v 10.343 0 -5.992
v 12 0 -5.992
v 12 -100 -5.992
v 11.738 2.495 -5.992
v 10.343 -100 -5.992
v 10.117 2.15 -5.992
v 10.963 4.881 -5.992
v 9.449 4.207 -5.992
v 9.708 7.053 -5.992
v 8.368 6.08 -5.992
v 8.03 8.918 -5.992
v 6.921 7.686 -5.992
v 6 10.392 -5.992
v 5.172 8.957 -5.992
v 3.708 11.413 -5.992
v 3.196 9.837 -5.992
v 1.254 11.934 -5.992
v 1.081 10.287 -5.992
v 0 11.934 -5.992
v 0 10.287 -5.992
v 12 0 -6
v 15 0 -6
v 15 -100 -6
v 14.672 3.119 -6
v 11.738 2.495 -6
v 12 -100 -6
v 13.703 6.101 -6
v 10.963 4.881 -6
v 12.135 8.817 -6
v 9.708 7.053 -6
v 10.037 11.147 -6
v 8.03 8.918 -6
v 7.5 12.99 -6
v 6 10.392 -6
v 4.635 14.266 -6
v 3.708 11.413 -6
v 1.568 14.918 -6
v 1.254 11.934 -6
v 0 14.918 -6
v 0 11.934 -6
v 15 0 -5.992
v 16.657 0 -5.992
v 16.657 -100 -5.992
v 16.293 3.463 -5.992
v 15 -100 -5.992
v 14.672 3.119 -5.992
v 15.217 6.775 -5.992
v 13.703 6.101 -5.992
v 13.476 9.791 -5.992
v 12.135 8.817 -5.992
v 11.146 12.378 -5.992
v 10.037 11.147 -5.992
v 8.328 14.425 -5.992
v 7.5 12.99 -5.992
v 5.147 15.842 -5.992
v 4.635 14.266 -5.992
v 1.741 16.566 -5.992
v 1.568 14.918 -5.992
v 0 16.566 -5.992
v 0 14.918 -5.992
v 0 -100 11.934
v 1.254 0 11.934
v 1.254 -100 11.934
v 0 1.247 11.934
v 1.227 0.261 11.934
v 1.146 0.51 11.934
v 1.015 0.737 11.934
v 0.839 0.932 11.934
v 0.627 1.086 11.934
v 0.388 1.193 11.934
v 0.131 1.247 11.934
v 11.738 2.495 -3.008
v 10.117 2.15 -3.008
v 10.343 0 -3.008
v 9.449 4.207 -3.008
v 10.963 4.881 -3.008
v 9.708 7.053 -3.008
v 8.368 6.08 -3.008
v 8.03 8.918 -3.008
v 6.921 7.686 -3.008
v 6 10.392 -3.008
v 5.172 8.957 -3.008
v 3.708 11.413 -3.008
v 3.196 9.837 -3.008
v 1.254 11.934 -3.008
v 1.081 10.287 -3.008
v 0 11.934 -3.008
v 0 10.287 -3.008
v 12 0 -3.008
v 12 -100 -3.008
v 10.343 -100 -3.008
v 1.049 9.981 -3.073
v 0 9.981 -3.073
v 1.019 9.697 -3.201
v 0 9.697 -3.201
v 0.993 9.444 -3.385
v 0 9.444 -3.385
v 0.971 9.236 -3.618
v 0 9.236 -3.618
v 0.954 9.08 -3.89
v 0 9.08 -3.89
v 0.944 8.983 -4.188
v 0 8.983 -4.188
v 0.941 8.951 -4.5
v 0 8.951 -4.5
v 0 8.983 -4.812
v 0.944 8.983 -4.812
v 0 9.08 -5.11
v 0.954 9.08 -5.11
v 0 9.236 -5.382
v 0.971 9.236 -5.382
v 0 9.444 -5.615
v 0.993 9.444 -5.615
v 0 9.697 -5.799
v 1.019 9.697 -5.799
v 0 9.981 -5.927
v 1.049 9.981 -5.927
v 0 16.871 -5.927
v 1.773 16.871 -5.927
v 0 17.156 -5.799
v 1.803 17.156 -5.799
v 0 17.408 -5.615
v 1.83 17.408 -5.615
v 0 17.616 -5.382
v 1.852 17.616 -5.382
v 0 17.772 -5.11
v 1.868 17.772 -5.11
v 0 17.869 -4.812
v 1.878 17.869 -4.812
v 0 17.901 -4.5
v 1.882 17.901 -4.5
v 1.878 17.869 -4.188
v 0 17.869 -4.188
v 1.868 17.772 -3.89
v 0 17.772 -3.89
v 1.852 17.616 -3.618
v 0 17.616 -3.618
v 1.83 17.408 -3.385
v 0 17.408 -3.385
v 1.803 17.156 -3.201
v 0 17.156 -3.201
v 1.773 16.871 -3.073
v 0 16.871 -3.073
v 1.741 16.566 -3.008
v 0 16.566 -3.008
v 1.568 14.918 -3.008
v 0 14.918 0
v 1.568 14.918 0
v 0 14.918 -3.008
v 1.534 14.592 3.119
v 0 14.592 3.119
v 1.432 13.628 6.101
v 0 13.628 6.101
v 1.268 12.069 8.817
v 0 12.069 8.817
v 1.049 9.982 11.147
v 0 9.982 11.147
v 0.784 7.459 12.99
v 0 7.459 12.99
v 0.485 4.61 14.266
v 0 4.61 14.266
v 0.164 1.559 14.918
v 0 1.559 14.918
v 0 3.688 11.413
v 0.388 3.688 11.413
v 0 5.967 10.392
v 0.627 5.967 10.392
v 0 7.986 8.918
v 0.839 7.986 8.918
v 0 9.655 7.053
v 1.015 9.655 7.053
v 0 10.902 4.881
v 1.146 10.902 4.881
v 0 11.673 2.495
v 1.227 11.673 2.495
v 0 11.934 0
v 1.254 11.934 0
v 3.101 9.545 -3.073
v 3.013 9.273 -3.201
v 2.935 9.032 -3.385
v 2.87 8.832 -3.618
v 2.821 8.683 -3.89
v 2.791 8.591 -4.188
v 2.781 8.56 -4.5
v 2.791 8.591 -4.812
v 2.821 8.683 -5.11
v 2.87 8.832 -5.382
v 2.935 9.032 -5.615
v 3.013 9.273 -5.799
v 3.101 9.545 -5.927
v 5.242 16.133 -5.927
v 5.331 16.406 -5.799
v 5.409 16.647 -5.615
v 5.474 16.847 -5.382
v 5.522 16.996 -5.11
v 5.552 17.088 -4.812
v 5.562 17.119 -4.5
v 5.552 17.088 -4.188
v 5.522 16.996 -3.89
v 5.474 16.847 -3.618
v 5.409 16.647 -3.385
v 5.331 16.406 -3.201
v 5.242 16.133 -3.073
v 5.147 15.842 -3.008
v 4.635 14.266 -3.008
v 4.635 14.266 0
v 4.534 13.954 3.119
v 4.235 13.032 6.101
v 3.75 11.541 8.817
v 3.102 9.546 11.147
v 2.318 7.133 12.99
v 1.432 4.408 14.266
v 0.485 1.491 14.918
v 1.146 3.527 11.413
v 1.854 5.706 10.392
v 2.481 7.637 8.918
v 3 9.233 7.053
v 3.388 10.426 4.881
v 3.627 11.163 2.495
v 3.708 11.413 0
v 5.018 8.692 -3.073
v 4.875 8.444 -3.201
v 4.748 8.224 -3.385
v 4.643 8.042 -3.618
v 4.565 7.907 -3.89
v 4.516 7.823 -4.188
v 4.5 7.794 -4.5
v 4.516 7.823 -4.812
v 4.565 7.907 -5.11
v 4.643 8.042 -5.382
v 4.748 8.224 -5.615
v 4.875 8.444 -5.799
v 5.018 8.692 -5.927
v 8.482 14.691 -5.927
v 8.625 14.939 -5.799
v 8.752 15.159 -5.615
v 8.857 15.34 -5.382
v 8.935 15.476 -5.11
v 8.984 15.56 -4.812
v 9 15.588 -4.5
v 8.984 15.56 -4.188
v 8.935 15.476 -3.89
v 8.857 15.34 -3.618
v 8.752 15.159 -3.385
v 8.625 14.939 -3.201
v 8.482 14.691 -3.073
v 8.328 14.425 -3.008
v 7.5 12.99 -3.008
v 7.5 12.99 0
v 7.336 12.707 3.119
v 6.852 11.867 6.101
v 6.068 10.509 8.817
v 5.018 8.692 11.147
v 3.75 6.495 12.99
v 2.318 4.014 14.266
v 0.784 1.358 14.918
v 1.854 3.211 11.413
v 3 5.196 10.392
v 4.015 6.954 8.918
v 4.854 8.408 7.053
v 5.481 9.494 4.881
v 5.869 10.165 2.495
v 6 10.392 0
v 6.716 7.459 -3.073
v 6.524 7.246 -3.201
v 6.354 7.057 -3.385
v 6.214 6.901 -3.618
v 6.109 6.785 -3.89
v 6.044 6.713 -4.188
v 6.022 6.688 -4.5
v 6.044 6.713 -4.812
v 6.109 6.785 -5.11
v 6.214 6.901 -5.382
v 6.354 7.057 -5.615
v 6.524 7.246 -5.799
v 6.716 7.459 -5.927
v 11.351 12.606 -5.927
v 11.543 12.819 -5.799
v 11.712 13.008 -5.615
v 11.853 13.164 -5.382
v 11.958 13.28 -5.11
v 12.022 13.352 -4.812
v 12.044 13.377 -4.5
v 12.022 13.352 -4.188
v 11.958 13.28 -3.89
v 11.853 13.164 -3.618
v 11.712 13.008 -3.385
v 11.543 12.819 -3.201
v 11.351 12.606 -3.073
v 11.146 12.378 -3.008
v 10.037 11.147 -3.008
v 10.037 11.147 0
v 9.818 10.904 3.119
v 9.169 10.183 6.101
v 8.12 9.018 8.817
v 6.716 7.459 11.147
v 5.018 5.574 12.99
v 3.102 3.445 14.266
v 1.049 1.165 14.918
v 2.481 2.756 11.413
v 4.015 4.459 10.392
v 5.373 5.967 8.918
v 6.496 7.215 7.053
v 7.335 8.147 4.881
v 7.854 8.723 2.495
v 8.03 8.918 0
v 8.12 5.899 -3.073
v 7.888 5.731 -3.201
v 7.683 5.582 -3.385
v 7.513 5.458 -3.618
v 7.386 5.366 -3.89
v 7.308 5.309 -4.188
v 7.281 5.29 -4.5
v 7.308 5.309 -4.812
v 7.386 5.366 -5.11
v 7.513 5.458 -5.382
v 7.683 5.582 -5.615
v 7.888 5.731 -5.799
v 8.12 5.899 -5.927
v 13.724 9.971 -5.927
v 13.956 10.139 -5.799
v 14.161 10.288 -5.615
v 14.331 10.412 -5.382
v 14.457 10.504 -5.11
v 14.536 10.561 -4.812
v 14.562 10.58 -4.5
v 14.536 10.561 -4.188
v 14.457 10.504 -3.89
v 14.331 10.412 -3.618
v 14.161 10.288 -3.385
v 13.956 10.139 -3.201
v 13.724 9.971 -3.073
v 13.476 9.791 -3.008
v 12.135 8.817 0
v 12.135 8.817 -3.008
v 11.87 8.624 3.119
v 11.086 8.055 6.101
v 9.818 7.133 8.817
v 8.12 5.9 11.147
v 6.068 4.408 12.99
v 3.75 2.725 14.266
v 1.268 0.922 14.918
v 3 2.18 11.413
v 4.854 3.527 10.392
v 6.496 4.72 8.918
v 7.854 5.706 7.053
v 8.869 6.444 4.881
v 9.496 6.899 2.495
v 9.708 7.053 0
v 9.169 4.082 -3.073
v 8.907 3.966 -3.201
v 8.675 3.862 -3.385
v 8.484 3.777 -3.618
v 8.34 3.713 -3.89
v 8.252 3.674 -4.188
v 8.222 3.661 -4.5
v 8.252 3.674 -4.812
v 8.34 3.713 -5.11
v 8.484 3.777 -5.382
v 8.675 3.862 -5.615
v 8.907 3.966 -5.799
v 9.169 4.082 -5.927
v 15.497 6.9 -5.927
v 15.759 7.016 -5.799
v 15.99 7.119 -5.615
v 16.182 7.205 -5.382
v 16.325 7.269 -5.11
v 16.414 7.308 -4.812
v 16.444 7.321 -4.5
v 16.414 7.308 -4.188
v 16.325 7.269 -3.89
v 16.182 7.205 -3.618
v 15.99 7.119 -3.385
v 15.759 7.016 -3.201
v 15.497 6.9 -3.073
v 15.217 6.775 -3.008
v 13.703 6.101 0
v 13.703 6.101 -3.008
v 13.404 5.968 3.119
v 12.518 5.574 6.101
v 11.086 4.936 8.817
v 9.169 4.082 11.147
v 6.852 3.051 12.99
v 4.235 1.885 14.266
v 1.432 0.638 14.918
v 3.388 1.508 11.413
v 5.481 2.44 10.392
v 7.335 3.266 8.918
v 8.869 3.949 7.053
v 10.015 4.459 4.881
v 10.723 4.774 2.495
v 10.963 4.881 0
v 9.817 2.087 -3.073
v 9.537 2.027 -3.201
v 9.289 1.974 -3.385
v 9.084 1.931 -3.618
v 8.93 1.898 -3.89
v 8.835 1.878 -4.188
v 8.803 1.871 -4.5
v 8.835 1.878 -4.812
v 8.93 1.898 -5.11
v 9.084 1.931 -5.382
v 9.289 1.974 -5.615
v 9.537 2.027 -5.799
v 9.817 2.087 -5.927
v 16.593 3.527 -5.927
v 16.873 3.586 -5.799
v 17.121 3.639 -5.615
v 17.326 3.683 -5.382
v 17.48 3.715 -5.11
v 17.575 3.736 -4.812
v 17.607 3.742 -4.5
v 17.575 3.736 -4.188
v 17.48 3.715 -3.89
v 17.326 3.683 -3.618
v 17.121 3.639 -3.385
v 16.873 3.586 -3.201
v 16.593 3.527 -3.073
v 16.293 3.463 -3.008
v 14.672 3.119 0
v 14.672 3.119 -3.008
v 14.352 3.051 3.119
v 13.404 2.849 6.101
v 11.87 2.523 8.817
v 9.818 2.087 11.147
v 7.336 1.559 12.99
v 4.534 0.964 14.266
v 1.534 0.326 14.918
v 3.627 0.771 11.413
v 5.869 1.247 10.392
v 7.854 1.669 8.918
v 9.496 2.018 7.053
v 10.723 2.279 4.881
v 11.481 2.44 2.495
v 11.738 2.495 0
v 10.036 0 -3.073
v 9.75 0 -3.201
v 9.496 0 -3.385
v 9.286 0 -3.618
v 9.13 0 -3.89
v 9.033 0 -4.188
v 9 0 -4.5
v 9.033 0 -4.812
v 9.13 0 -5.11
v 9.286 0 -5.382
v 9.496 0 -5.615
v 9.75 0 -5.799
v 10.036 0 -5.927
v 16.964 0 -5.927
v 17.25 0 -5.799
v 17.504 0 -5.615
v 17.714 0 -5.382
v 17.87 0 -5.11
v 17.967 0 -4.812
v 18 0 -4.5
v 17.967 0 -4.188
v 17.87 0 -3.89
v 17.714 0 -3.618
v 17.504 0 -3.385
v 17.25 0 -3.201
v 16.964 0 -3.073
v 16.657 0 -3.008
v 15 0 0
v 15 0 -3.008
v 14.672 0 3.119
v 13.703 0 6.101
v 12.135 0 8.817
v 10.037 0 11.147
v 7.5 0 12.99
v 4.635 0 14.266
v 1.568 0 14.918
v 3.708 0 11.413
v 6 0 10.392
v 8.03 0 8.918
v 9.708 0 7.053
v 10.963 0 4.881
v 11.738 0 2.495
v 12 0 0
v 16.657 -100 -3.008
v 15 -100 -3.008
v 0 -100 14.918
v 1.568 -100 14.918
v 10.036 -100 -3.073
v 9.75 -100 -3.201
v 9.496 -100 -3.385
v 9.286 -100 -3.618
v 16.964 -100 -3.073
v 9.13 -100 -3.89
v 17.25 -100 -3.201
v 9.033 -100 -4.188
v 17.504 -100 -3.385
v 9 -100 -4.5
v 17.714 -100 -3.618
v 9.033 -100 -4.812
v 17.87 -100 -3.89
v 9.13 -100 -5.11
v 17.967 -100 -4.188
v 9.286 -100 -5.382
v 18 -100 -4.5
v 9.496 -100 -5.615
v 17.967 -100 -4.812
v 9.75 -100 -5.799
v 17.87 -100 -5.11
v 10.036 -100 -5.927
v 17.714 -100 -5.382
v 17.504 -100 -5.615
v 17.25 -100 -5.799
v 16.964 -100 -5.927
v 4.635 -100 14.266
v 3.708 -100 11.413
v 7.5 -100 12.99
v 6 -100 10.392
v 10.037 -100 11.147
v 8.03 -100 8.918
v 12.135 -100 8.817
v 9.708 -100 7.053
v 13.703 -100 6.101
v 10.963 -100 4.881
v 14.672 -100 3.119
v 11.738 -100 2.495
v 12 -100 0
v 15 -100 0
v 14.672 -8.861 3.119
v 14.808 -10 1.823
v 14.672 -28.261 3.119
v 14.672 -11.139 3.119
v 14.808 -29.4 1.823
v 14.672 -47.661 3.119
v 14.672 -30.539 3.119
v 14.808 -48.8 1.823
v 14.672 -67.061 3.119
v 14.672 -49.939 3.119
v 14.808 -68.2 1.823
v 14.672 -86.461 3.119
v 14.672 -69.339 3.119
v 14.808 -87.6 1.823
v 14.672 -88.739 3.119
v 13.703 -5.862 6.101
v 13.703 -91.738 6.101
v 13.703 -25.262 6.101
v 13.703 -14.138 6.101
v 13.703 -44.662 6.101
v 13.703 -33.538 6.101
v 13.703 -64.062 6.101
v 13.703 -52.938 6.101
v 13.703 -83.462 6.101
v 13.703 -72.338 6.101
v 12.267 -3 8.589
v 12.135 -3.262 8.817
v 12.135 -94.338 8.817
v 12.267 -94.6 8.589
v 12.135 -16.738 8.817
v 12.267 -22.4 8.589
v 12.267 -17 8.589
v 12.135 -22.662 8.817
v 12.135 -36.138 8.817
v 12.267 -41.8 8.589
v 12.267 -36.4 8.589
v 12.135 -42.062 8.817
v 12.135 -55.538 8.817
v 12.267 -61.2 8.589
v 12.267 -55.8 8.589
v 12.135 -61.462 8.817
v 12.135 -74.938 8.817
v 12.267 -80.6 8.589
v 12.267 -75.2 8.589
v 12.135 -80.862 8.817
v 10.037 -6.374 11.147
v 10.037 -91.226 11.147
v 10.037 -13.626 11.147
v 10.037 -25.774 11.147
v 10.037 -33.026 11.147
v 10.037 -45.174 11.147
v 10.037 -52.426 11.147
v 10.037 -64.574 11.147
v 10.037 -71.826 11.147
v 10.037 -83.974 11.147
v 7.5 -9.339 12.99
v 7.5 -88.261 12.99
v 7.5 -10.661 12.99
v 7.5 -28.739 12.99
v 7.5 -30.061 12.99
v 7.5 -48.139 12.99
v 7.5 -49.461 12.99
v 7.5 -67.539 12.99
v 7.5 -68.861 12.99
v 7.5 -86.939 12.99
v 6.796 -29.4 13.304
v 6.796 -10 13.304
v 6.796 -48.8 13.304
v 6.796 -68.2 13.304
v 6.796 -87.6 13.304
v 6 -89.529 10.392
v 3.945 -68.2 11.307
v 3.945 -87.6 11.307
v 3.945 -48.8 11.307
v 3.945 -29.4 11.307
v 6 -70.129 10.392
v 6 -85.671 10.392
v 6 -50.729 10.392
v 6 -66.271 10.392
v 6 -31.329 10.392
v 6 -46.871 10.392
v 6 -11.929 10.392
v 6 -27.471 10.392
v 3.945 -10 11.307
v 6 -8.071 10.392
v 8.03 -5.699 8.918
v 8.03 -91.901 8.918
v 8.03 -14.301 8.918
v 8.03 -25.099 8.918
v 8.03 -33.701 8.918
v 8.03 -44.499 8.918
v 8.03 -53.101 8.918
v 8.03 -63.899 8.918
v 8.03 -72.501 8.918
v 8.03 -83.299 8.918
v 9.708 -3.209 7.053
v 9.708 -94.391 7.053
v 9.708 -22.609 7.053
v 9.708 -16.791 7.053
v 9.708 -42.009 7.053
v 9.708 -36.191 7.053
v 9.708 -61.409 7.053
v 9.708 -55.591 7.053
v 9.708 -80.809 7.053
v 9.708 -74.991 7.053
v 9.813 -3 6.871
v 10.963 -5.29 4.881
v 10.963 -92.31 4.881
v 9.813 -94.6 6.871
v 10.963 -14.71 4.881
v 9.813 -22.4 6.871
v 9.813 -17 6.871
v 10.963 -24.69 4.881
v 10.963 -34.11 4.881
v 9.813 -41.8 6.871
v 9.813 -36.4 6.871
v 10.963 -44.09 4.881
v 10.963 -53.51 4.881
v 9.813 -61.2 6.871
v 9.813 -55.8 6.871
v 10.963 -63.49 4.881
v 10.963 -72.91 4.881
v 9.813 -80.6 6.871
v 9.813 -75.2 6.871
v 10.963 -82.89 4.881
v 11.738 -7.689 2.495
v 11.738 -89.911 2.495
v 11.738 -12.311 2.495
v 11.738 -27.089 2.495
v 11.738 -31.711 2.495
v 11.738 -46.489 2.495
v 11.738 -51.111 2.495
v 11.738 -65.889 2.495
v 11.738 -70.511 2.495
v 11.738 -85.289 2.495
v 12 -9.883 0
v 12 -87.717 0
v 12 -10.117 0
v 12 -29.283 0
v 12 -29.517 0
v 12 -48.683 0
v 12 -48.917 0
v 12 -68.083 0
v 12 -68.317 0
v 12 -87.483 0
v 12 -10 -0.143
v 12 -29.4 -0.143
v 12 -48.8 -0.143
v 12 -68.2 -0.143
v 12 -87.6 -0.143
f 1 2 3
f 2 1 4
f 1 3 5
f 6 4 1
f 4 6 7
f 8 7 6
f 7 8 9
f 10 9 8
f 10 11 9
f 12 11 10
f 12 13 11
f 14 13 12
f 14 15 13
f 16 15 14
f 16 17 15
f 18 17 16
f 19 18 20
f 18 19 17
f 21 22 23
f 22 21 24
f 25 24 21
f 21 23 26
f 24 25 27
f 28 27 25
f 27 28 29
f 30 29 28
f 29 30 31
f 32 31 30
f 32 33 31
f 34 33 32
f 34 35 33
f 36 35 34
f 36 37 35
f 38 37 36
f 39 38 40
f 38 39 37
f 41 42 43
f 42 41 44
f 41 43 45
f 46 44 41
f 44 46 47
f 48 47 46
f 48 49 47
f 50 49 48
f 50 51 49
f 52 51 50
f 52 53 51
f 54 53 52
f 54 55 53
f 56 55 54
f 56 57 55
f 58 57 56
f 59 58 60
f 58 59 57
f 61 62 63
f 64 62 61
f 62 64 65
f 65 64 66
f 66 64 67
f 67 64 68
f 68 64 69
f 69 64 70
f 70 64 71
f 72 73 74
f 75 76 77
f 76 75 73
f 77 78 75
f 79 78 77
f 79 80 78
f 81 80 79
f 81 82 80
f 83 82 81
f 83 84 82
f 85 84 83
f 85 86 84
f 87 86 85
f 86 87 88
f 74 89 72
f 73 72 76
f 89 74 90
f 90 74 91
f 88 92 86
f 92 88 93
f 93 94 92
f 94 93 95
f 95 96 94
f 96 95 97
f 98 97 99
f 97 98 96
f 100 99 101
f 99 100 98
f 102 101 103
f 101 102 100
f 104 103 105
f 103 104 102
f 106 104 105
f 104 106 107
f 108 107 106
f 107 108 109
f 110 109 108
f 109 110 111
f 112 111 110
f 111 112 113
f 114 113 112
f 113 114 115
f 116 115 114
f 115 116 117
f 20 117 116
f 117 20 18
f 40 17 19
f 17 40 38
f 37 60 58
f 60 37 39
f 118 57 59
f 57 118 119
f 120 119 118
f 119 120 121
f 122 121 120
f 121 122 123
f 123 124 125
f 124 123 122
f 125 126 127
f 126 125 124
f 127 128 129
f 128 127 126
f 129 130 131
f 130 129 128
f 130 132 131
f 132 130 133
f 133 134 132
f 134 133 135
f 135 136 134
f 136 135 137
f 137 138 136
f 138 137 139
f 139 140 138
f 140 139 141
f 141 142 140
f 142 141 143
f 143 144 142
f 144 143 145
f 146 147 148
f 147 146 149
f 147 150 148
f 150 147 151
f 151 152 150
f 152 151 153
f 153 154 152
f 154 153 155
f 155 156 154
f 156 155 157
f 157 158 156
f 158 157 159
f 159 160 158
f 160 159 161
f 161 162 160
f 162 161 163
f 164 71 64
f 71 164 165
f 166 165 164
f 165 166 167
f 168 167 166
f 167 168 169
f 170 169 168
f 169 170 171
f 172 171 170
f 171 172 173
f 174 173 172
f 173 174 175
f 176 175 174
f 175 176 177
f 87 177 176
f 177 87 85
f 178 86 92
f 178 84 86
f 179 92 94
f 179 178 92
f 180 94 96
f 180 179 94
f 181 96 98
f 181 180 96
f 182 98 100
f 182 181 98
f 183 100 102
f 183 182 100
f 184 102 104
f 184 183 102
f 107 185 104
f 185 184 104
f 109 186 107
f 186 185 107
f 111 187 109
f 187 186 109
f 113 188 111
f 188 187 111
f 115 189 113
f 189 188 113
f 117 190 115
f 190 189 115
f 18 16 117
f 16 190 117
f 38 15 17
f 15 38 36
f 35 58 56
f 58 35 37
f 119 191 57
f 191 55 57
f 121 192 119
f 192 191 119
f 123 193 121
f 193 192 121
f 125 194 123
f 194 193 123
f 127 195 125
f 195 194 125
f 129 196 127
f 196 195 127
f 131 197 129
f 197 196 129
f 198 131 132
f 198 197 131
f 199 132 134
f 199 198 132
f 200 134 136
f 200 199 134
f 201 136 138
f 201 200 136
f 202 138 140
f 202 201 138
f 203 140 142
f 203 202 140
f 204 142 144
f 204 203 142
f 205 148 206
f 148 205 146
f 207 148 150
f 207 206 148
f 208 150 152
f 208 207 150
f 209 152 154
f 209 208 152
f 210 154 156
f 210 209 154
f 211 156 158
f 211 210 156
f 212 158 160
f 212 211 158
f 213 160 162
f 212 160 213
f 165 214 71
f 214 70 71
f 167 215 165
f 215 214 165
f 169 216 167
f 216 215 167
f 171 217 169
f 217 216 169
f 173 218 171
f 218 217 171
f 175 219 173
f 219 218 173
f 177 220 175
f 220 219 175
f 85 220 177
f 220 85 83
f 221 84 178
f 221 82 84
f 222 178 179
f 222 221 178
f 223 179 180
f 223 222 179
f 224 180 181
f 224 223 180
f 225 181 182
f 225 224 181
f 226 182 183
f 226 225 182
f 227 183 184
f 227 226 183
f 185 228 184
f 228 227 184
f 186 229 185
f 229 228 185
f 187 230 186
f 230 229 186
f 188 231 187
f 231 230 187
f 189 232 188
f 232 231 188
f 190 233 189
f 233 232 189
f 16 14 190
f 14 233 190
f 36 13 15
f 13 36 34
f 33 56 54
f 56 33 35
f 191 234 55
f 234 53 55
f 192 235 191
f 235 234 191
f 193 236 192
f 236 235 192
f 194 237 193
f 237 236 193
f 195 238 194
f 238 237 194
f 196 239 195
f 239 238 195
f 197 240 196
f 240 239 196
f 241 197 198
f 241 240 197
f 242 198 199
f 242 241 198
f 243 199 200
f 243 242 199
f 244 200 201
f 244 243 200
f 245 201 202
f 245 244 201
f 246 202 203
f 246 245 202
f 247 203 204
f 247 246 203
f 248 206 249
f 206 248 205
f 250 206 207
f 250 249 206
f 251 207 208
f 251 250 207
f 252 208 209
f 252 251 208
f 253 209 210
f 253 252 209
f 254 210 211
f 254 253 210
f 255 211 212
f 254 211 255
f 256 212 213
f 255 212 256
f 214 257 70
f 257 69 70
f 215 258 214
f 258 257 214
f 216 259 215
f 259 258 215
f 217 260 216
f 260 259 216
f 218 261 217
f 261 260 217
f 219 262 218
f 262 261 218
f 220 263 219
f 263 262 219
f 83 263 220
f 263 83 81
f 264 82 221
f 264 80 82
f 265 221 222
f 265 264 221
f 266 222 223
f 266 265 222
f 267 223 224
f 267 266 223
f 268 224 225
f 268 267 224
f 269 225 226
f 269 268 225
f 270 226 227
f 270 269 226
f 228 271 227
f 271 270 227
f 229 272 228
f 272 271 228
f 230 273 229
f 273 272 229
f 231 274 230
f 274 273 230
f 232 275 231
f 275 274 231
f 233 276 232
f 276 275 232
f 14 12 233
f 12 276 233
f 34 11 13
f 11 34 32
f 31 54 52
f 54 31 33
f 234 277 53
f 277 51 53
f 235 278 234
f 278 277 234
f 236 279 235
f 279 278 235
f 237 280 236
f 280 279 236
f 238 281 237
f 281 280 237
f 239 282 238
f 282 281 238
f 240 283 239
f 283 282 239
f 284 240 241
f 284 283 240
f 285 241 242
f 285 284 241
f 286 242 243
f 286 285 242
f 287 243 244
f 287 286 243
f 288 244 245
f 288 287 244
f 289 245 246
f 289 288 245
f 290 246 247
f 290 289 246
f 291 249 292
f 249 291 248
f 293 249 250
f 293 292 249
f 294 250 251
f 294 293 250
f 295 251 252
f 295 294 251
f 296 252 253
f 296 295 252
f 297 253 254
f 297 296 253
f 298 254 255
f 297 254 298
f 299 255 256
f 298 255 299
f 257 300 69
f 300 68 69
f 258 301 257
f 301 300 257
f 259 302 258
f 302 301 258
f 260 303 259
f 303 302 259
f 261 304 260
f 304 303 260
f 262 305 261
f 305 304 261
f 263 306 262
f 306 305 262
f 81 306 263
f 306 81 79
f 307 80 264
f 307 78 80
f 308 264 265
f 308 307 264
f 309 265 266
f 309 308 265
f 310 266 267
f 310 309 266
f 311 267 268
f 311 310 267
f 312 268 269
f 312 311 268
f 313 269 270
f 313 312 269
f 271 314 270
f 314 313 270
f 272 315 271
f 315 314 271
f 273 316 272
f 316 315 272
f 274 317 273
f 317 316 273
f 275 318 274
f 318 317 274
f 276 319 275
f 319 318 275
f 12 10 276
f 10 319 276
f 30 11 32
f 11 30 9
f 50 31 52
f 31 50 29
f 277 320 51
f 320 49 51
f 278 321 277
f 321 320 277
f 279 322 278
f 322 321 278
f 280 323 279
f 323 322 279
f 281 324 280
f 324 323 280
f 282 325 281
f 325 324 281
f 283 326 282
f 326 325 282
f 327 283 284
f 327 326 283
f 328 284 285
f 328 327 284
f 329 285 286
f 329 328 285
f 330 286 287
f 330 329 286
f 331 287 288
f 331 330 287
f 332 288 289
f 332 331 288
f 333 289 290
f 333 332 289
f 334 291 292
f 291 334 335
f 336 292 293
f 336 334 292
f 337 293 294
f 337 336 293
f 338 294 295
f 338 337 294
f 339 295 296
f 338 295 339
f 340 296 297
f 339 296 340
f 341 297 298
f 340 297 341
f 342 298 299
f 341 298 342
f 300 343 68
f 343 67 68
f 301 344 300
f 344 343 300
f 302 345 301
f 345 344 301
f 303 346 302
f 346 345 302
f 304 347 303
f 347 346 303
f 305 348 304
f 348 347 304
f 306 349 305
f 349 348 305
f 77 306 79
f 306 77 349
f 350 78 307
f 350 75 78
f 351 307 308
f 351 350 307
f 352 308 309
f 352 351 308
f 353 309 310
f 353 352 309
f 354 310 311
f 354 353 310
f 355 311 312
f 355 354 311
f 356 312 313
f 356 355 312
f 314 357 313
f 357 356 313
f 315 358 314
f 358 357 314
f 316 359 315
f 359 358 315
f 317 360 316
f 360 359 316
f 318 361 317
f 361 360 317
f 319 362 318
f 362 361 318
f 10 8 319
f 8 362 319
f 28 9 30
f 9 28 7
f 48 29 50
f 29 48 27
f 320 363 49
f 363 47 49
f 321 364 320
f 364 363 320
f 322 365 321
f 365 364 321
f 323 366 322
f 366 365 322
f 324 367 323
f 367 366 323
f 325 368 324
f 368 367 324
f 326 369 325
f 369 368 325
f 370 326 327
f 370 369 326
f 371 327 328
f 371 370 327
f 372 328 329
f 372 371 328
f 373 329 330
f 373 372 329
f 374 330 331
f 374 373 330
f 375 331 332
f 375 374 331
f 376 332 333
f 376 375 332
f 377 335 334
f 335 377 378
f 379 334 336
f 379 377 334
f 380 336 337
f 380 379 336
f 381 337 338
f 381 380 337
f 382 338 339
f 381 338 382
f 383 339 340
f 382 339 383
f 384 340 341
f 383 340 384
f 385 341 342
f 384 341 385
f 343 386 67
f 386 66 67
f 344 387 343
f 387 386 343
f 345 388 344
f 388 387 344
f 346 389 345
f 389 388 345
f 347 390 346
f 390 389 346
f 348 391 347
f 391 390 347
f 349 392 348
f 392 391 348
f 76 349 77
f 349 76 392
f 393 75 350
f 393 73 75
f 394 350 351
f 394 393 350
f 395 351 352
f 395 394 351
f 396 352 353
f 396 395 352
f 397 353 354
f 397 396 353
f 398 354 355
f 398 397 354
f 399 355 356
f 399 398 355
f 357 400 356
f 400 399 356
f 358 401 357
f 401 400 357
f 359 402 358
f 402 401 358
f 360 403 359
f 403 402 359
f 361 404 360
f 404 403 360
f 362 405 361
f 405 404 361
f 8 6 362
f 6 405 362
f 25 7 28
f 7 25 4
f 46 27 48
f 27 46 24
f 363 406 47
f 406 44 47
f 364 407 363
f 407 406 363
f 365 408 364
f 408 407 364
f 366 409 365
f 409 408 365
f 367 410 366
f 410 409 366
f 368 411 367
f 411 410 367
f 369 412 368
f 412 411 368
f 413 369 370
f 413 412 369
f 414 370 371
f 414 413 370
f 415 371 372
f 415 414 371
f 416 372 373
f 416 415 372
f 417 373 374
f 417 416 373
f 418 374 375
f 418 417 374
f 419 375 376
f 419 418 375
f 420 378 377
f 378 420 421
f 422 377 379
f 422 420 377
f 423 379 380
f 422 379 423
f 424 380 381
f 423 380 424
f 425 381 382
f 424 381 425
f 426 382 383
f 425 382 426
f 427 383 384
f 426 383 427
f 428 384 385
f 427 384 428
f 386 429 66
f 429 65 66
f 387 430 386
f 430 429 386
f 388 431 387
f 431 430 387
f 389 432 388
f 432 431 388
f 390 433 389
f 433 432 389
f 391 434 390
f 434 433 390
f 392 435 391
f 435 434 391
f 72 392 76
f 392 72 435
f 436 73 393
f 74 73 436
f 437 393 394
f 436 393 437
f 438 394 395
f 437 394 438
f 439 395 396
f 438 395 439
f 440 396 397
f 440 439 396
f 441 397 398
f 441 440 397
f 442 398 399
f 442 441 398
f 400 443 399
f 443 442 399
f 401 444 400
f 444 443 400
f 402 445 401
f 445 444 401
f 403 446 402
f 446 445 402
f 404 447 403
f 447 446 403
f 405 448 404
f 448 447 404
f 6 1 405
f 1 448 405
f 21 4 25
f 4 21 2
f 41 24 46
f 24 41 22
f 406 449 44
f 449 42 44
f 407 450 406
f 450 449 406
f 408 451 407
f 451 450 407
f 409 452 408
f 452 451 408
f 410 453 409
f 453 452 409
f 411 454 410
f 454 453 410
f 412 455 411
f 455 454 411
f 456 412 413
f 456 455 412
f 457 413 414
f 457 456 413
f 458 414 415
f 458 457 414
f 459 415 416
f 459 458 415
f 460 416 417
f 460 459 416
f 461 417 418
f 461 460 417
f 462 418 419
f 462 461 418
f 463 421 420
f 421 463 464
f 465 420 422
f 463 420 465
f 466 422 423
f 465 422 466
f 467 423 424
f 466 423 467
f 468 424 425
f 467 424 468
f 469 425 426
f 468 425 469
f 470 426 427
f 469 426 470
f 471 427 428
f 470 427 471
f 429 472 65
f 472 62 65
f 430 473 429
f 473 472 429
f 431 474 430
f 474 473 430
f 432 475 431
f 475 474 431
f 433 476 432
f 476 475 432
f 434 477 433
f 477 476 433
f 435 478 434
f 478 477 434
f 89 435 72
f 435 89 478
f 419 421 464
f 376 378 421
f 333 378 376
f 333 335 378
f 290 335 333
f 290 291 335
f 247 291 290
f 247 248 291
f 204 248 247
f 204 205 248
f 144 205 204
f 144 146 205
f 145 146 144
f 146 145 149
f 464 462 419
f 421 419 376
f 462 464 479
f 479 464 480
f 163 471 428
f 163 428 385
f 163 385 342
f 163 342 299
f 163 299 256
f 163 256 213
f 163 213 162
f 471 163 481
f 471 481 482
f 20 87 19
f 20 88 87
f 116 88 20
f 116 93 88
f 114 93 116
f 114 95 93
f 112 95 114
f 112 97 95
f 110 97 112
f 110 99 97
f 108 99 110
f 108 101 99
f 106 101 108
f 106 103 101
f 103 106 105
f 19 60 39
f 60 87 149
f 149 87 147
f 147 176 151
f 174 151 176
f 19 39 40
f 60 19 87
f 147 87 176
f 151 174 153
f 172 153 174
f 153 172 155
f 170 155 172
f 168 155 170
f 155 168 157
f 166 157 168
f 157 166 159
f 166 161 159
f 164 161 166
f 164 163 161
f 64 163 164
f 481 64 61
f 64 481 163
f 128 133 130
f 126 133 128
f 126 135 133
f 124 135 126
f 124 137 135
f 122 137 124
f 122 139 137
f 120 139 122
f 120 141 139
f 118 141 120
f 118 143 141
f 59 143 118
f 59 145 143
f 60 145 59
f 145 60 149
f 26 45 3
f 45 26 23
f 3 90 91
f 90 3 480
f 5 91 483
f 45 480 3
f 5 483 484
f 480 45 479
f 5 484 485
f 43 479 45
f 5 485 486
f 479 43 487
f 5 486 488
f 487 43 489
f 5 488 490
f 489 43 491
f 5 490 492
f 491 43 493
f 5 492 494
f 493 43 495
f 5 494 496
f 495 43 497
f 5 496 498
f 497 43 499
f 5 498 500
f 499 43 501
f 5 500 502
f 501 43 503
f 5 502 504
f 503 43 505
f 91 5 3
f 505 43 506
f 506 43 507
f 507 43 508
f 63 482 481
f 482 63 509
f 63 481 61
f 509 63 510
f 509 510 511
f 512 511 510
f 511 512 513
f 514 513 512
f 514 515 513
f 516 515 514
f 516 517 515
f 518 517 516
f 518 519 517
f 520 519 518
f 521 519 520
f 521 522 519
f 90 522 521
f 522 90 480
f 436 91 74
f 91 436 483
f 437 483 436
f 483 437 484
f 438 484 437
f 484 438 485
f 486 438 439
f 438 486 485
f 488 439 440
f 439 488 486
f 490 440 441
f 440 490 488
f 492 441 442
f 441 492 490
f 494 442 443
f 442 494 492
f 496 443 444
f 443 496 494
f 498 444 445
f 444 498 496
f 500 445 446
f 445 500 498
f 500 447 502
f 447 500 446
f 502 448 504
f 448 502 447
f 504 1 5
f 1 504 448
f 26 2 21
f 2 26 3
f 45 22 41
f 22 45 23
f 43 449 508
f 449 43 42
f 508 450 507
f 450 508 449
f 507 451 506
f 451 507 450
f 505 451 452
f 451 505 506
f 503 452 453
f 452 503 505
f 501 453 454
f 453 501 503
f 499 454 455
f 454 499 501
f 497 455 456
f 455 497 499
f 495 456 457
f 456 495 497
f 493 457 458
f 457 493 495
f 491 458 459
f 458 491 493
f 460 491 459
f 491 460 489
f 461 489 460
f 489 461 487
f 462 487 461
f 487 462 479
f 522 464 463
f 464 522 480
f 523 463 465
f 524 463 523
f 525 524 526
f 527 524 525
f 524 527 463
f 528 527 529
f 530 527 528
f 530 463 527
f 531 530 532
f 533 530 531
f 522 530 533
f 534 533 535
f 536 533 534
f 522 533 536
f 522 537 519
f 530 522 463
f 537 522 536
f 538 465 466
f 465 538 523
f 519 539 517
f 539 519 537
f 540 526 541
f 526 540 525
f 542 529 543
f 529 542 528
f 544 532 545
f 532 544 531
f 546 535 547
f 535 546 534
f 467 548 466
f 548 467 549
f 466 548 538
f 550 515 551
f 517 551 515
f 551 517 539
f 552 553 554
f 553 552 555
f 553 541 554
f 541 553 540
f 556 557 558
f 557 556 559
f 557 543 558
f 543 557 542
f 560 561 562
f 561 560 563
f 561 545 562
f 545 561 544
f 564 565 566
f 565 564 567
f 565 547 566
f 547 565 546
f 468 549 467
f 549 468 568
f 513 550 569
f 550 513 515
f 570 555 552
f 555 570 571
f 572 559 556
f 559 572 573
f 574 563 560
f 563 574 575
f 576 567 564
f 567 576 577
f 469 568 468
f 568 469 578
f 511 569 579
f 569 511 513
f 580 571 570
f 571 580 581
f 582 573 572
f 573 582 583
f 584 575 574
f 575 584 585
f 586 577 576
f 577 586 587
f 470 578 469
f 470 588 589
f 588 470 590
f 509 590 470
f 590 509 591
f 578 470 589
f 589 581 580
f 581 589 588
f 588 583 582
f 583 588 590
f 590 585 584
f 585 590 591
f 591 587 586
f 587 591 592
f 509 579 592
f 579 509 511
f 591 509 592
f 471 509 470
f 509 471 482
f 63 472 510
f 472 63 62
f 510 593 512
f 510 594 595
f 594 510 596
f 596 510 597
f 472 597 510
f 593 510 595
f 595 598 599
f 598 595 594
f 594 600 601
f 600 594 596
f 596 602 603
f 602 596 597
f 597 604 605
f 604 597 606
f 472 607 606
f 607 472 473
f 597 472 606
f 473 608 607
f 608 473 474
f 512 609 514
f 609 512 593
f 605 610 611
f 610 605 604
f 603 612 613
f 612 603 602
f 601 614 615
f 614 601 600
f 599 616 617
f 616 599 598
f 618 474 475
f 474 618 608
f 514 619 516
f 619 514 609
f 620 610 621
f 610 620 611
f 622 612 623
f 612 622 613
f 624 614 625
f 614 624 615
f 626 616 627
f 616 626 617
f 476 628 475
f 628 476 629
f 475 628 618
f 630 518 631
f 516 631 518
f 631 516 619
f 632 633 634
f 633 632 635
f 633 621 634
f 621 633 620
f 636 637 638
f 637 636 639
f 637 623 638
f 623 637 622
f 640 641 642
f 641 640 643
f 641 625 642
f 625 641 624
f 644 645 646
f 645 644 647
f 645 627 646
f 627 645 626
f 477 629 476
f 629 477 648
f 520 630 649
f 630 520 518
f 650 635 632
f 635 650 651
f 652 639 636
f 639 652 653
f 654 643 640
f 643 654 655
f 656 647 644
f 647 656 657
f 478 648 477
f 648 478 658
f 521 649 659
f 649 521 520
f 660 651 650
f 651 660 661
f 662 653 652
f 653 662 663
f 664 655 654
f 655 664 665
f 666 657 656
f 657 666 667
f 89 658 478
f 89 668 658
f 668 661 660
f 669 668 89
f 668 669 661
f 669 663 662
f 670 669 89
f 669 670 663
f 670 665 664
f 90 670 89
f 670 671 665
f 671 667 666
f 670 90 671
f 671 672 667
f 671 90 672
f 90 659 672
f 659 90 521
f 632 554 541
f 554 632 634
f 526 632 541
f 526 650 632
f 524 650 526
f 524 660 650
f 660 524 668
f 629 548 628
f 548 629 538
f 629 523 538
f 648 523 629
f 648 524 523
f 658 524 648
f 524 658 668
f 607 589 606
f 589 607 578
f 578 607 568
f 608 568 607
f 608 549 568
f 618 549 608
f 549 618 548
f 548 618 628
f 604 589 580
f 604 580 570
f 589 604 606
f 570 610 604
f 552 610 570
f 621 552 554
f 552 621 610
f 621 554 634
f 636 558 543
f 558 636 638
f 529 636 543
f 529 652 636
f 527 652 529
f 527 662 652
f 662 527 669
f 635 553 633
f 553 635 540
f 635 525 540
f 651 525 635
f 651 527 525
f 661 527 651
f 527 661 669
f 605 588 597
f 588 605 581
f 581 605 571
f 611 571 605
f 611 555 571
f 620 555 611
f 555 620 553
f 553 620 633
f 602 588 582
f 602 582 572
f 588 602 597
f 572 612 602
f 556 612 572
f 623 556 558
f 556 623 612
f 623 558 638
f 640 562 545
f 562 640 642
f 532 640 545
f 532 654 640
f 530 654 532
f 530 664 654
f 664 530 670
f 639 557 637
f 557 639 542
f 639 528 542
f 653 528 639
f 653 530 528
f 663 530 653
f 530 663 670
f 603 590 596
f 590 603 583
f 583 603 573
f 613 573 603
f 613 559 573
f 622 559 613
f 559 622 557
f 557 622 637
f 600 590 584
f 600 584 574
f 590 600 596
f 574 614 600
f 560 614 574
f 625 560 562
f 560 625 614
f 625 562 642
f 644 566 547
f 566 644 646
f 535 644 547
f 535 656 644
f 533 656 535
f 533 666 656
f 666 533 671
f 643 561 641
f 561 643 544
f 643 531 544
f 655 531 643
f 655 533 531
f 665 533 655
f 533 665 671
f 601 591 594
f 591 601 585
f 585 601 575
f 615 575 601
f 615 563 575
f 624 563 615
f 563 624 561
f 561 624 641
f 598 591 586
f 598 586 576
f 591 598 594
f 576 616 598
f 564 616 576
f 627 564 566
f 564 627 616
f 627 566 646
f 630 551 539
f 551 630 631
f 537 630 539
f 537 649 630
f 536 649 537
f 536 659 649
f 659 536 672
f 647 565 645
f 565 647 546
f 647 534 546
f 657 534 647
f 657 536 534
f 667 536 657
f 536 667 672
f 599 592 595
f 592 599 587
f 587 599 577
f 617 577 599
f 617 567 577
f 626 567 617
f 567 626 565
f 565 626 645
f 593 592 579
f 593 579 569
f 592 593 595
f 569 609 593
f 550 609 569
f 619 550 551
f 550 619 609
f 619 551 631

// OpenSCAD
//
//  Copyright (C) 09-01-2014 Jasper den Ouden.(ojasper.nl)
//
//  This is free software: you can redistribute it and/or modify
//  it under the terms of the GNU General Public License as published
//  by the Free Software Foundation, either version 3 of the License, or
//  (at your option) any later version.
//

$fs=0.1;

$R=15;
$t=3;
$s=0.4;

//NOTE the curve thing seems potentially overkill!
//TODO cut that out.
module rail2d()
{   intersection()
    {   circle($R);
        difference()
        {   square($R*[2,2]);
            circle($R-$t);
        }
    }
    translate([$R-$t,-2*$t]) square($t*[1,2]);
    translate([$R-1.5*$t,-1.5*$t]) hull()
    {   circle($t/2); translate([2*$t,0]) circle($t/2); }
}

module slider2d()
{   difference()
    {   union()
        {
            for(x=$t*[1.5,-1.5]) hull()
            {   translate([x,0]) circle($s+$t);
                translate([x,$t/4]) circle($t);
                translate([0,-$s]) circle(1.25*$t);
            }
        }
        translate([$t/2-$R,1.5*($t+$s)]) rail2d($t=$t+$s);
    }
}
module rail(l=100,n=5)
{
    difference()
    {   linear_extrude(height=l) rail2d();
        //Pokes holes.
        if(n>0) rotate(-145) rotate([0,-90,0]) linear_extrude(height=l) 
            for(x=[l/(2*n):(l-$t)/n:l]) translate([x,0])
                                            circle(l/(2*n)-$t,$fn=4);
    }
}
module rail_corner(a=90)
{
    intersection()
    {   rotate_extrude() rail2d();
        translate([-4,0,-4]*$R) cube($R*[8,8,8]);
        rotate(180+a) translate([-4,0,-4]*$R) cube($R*[8,8,8]);
    }
}

rail_corner();
rotate([90,0,0]) rail();
